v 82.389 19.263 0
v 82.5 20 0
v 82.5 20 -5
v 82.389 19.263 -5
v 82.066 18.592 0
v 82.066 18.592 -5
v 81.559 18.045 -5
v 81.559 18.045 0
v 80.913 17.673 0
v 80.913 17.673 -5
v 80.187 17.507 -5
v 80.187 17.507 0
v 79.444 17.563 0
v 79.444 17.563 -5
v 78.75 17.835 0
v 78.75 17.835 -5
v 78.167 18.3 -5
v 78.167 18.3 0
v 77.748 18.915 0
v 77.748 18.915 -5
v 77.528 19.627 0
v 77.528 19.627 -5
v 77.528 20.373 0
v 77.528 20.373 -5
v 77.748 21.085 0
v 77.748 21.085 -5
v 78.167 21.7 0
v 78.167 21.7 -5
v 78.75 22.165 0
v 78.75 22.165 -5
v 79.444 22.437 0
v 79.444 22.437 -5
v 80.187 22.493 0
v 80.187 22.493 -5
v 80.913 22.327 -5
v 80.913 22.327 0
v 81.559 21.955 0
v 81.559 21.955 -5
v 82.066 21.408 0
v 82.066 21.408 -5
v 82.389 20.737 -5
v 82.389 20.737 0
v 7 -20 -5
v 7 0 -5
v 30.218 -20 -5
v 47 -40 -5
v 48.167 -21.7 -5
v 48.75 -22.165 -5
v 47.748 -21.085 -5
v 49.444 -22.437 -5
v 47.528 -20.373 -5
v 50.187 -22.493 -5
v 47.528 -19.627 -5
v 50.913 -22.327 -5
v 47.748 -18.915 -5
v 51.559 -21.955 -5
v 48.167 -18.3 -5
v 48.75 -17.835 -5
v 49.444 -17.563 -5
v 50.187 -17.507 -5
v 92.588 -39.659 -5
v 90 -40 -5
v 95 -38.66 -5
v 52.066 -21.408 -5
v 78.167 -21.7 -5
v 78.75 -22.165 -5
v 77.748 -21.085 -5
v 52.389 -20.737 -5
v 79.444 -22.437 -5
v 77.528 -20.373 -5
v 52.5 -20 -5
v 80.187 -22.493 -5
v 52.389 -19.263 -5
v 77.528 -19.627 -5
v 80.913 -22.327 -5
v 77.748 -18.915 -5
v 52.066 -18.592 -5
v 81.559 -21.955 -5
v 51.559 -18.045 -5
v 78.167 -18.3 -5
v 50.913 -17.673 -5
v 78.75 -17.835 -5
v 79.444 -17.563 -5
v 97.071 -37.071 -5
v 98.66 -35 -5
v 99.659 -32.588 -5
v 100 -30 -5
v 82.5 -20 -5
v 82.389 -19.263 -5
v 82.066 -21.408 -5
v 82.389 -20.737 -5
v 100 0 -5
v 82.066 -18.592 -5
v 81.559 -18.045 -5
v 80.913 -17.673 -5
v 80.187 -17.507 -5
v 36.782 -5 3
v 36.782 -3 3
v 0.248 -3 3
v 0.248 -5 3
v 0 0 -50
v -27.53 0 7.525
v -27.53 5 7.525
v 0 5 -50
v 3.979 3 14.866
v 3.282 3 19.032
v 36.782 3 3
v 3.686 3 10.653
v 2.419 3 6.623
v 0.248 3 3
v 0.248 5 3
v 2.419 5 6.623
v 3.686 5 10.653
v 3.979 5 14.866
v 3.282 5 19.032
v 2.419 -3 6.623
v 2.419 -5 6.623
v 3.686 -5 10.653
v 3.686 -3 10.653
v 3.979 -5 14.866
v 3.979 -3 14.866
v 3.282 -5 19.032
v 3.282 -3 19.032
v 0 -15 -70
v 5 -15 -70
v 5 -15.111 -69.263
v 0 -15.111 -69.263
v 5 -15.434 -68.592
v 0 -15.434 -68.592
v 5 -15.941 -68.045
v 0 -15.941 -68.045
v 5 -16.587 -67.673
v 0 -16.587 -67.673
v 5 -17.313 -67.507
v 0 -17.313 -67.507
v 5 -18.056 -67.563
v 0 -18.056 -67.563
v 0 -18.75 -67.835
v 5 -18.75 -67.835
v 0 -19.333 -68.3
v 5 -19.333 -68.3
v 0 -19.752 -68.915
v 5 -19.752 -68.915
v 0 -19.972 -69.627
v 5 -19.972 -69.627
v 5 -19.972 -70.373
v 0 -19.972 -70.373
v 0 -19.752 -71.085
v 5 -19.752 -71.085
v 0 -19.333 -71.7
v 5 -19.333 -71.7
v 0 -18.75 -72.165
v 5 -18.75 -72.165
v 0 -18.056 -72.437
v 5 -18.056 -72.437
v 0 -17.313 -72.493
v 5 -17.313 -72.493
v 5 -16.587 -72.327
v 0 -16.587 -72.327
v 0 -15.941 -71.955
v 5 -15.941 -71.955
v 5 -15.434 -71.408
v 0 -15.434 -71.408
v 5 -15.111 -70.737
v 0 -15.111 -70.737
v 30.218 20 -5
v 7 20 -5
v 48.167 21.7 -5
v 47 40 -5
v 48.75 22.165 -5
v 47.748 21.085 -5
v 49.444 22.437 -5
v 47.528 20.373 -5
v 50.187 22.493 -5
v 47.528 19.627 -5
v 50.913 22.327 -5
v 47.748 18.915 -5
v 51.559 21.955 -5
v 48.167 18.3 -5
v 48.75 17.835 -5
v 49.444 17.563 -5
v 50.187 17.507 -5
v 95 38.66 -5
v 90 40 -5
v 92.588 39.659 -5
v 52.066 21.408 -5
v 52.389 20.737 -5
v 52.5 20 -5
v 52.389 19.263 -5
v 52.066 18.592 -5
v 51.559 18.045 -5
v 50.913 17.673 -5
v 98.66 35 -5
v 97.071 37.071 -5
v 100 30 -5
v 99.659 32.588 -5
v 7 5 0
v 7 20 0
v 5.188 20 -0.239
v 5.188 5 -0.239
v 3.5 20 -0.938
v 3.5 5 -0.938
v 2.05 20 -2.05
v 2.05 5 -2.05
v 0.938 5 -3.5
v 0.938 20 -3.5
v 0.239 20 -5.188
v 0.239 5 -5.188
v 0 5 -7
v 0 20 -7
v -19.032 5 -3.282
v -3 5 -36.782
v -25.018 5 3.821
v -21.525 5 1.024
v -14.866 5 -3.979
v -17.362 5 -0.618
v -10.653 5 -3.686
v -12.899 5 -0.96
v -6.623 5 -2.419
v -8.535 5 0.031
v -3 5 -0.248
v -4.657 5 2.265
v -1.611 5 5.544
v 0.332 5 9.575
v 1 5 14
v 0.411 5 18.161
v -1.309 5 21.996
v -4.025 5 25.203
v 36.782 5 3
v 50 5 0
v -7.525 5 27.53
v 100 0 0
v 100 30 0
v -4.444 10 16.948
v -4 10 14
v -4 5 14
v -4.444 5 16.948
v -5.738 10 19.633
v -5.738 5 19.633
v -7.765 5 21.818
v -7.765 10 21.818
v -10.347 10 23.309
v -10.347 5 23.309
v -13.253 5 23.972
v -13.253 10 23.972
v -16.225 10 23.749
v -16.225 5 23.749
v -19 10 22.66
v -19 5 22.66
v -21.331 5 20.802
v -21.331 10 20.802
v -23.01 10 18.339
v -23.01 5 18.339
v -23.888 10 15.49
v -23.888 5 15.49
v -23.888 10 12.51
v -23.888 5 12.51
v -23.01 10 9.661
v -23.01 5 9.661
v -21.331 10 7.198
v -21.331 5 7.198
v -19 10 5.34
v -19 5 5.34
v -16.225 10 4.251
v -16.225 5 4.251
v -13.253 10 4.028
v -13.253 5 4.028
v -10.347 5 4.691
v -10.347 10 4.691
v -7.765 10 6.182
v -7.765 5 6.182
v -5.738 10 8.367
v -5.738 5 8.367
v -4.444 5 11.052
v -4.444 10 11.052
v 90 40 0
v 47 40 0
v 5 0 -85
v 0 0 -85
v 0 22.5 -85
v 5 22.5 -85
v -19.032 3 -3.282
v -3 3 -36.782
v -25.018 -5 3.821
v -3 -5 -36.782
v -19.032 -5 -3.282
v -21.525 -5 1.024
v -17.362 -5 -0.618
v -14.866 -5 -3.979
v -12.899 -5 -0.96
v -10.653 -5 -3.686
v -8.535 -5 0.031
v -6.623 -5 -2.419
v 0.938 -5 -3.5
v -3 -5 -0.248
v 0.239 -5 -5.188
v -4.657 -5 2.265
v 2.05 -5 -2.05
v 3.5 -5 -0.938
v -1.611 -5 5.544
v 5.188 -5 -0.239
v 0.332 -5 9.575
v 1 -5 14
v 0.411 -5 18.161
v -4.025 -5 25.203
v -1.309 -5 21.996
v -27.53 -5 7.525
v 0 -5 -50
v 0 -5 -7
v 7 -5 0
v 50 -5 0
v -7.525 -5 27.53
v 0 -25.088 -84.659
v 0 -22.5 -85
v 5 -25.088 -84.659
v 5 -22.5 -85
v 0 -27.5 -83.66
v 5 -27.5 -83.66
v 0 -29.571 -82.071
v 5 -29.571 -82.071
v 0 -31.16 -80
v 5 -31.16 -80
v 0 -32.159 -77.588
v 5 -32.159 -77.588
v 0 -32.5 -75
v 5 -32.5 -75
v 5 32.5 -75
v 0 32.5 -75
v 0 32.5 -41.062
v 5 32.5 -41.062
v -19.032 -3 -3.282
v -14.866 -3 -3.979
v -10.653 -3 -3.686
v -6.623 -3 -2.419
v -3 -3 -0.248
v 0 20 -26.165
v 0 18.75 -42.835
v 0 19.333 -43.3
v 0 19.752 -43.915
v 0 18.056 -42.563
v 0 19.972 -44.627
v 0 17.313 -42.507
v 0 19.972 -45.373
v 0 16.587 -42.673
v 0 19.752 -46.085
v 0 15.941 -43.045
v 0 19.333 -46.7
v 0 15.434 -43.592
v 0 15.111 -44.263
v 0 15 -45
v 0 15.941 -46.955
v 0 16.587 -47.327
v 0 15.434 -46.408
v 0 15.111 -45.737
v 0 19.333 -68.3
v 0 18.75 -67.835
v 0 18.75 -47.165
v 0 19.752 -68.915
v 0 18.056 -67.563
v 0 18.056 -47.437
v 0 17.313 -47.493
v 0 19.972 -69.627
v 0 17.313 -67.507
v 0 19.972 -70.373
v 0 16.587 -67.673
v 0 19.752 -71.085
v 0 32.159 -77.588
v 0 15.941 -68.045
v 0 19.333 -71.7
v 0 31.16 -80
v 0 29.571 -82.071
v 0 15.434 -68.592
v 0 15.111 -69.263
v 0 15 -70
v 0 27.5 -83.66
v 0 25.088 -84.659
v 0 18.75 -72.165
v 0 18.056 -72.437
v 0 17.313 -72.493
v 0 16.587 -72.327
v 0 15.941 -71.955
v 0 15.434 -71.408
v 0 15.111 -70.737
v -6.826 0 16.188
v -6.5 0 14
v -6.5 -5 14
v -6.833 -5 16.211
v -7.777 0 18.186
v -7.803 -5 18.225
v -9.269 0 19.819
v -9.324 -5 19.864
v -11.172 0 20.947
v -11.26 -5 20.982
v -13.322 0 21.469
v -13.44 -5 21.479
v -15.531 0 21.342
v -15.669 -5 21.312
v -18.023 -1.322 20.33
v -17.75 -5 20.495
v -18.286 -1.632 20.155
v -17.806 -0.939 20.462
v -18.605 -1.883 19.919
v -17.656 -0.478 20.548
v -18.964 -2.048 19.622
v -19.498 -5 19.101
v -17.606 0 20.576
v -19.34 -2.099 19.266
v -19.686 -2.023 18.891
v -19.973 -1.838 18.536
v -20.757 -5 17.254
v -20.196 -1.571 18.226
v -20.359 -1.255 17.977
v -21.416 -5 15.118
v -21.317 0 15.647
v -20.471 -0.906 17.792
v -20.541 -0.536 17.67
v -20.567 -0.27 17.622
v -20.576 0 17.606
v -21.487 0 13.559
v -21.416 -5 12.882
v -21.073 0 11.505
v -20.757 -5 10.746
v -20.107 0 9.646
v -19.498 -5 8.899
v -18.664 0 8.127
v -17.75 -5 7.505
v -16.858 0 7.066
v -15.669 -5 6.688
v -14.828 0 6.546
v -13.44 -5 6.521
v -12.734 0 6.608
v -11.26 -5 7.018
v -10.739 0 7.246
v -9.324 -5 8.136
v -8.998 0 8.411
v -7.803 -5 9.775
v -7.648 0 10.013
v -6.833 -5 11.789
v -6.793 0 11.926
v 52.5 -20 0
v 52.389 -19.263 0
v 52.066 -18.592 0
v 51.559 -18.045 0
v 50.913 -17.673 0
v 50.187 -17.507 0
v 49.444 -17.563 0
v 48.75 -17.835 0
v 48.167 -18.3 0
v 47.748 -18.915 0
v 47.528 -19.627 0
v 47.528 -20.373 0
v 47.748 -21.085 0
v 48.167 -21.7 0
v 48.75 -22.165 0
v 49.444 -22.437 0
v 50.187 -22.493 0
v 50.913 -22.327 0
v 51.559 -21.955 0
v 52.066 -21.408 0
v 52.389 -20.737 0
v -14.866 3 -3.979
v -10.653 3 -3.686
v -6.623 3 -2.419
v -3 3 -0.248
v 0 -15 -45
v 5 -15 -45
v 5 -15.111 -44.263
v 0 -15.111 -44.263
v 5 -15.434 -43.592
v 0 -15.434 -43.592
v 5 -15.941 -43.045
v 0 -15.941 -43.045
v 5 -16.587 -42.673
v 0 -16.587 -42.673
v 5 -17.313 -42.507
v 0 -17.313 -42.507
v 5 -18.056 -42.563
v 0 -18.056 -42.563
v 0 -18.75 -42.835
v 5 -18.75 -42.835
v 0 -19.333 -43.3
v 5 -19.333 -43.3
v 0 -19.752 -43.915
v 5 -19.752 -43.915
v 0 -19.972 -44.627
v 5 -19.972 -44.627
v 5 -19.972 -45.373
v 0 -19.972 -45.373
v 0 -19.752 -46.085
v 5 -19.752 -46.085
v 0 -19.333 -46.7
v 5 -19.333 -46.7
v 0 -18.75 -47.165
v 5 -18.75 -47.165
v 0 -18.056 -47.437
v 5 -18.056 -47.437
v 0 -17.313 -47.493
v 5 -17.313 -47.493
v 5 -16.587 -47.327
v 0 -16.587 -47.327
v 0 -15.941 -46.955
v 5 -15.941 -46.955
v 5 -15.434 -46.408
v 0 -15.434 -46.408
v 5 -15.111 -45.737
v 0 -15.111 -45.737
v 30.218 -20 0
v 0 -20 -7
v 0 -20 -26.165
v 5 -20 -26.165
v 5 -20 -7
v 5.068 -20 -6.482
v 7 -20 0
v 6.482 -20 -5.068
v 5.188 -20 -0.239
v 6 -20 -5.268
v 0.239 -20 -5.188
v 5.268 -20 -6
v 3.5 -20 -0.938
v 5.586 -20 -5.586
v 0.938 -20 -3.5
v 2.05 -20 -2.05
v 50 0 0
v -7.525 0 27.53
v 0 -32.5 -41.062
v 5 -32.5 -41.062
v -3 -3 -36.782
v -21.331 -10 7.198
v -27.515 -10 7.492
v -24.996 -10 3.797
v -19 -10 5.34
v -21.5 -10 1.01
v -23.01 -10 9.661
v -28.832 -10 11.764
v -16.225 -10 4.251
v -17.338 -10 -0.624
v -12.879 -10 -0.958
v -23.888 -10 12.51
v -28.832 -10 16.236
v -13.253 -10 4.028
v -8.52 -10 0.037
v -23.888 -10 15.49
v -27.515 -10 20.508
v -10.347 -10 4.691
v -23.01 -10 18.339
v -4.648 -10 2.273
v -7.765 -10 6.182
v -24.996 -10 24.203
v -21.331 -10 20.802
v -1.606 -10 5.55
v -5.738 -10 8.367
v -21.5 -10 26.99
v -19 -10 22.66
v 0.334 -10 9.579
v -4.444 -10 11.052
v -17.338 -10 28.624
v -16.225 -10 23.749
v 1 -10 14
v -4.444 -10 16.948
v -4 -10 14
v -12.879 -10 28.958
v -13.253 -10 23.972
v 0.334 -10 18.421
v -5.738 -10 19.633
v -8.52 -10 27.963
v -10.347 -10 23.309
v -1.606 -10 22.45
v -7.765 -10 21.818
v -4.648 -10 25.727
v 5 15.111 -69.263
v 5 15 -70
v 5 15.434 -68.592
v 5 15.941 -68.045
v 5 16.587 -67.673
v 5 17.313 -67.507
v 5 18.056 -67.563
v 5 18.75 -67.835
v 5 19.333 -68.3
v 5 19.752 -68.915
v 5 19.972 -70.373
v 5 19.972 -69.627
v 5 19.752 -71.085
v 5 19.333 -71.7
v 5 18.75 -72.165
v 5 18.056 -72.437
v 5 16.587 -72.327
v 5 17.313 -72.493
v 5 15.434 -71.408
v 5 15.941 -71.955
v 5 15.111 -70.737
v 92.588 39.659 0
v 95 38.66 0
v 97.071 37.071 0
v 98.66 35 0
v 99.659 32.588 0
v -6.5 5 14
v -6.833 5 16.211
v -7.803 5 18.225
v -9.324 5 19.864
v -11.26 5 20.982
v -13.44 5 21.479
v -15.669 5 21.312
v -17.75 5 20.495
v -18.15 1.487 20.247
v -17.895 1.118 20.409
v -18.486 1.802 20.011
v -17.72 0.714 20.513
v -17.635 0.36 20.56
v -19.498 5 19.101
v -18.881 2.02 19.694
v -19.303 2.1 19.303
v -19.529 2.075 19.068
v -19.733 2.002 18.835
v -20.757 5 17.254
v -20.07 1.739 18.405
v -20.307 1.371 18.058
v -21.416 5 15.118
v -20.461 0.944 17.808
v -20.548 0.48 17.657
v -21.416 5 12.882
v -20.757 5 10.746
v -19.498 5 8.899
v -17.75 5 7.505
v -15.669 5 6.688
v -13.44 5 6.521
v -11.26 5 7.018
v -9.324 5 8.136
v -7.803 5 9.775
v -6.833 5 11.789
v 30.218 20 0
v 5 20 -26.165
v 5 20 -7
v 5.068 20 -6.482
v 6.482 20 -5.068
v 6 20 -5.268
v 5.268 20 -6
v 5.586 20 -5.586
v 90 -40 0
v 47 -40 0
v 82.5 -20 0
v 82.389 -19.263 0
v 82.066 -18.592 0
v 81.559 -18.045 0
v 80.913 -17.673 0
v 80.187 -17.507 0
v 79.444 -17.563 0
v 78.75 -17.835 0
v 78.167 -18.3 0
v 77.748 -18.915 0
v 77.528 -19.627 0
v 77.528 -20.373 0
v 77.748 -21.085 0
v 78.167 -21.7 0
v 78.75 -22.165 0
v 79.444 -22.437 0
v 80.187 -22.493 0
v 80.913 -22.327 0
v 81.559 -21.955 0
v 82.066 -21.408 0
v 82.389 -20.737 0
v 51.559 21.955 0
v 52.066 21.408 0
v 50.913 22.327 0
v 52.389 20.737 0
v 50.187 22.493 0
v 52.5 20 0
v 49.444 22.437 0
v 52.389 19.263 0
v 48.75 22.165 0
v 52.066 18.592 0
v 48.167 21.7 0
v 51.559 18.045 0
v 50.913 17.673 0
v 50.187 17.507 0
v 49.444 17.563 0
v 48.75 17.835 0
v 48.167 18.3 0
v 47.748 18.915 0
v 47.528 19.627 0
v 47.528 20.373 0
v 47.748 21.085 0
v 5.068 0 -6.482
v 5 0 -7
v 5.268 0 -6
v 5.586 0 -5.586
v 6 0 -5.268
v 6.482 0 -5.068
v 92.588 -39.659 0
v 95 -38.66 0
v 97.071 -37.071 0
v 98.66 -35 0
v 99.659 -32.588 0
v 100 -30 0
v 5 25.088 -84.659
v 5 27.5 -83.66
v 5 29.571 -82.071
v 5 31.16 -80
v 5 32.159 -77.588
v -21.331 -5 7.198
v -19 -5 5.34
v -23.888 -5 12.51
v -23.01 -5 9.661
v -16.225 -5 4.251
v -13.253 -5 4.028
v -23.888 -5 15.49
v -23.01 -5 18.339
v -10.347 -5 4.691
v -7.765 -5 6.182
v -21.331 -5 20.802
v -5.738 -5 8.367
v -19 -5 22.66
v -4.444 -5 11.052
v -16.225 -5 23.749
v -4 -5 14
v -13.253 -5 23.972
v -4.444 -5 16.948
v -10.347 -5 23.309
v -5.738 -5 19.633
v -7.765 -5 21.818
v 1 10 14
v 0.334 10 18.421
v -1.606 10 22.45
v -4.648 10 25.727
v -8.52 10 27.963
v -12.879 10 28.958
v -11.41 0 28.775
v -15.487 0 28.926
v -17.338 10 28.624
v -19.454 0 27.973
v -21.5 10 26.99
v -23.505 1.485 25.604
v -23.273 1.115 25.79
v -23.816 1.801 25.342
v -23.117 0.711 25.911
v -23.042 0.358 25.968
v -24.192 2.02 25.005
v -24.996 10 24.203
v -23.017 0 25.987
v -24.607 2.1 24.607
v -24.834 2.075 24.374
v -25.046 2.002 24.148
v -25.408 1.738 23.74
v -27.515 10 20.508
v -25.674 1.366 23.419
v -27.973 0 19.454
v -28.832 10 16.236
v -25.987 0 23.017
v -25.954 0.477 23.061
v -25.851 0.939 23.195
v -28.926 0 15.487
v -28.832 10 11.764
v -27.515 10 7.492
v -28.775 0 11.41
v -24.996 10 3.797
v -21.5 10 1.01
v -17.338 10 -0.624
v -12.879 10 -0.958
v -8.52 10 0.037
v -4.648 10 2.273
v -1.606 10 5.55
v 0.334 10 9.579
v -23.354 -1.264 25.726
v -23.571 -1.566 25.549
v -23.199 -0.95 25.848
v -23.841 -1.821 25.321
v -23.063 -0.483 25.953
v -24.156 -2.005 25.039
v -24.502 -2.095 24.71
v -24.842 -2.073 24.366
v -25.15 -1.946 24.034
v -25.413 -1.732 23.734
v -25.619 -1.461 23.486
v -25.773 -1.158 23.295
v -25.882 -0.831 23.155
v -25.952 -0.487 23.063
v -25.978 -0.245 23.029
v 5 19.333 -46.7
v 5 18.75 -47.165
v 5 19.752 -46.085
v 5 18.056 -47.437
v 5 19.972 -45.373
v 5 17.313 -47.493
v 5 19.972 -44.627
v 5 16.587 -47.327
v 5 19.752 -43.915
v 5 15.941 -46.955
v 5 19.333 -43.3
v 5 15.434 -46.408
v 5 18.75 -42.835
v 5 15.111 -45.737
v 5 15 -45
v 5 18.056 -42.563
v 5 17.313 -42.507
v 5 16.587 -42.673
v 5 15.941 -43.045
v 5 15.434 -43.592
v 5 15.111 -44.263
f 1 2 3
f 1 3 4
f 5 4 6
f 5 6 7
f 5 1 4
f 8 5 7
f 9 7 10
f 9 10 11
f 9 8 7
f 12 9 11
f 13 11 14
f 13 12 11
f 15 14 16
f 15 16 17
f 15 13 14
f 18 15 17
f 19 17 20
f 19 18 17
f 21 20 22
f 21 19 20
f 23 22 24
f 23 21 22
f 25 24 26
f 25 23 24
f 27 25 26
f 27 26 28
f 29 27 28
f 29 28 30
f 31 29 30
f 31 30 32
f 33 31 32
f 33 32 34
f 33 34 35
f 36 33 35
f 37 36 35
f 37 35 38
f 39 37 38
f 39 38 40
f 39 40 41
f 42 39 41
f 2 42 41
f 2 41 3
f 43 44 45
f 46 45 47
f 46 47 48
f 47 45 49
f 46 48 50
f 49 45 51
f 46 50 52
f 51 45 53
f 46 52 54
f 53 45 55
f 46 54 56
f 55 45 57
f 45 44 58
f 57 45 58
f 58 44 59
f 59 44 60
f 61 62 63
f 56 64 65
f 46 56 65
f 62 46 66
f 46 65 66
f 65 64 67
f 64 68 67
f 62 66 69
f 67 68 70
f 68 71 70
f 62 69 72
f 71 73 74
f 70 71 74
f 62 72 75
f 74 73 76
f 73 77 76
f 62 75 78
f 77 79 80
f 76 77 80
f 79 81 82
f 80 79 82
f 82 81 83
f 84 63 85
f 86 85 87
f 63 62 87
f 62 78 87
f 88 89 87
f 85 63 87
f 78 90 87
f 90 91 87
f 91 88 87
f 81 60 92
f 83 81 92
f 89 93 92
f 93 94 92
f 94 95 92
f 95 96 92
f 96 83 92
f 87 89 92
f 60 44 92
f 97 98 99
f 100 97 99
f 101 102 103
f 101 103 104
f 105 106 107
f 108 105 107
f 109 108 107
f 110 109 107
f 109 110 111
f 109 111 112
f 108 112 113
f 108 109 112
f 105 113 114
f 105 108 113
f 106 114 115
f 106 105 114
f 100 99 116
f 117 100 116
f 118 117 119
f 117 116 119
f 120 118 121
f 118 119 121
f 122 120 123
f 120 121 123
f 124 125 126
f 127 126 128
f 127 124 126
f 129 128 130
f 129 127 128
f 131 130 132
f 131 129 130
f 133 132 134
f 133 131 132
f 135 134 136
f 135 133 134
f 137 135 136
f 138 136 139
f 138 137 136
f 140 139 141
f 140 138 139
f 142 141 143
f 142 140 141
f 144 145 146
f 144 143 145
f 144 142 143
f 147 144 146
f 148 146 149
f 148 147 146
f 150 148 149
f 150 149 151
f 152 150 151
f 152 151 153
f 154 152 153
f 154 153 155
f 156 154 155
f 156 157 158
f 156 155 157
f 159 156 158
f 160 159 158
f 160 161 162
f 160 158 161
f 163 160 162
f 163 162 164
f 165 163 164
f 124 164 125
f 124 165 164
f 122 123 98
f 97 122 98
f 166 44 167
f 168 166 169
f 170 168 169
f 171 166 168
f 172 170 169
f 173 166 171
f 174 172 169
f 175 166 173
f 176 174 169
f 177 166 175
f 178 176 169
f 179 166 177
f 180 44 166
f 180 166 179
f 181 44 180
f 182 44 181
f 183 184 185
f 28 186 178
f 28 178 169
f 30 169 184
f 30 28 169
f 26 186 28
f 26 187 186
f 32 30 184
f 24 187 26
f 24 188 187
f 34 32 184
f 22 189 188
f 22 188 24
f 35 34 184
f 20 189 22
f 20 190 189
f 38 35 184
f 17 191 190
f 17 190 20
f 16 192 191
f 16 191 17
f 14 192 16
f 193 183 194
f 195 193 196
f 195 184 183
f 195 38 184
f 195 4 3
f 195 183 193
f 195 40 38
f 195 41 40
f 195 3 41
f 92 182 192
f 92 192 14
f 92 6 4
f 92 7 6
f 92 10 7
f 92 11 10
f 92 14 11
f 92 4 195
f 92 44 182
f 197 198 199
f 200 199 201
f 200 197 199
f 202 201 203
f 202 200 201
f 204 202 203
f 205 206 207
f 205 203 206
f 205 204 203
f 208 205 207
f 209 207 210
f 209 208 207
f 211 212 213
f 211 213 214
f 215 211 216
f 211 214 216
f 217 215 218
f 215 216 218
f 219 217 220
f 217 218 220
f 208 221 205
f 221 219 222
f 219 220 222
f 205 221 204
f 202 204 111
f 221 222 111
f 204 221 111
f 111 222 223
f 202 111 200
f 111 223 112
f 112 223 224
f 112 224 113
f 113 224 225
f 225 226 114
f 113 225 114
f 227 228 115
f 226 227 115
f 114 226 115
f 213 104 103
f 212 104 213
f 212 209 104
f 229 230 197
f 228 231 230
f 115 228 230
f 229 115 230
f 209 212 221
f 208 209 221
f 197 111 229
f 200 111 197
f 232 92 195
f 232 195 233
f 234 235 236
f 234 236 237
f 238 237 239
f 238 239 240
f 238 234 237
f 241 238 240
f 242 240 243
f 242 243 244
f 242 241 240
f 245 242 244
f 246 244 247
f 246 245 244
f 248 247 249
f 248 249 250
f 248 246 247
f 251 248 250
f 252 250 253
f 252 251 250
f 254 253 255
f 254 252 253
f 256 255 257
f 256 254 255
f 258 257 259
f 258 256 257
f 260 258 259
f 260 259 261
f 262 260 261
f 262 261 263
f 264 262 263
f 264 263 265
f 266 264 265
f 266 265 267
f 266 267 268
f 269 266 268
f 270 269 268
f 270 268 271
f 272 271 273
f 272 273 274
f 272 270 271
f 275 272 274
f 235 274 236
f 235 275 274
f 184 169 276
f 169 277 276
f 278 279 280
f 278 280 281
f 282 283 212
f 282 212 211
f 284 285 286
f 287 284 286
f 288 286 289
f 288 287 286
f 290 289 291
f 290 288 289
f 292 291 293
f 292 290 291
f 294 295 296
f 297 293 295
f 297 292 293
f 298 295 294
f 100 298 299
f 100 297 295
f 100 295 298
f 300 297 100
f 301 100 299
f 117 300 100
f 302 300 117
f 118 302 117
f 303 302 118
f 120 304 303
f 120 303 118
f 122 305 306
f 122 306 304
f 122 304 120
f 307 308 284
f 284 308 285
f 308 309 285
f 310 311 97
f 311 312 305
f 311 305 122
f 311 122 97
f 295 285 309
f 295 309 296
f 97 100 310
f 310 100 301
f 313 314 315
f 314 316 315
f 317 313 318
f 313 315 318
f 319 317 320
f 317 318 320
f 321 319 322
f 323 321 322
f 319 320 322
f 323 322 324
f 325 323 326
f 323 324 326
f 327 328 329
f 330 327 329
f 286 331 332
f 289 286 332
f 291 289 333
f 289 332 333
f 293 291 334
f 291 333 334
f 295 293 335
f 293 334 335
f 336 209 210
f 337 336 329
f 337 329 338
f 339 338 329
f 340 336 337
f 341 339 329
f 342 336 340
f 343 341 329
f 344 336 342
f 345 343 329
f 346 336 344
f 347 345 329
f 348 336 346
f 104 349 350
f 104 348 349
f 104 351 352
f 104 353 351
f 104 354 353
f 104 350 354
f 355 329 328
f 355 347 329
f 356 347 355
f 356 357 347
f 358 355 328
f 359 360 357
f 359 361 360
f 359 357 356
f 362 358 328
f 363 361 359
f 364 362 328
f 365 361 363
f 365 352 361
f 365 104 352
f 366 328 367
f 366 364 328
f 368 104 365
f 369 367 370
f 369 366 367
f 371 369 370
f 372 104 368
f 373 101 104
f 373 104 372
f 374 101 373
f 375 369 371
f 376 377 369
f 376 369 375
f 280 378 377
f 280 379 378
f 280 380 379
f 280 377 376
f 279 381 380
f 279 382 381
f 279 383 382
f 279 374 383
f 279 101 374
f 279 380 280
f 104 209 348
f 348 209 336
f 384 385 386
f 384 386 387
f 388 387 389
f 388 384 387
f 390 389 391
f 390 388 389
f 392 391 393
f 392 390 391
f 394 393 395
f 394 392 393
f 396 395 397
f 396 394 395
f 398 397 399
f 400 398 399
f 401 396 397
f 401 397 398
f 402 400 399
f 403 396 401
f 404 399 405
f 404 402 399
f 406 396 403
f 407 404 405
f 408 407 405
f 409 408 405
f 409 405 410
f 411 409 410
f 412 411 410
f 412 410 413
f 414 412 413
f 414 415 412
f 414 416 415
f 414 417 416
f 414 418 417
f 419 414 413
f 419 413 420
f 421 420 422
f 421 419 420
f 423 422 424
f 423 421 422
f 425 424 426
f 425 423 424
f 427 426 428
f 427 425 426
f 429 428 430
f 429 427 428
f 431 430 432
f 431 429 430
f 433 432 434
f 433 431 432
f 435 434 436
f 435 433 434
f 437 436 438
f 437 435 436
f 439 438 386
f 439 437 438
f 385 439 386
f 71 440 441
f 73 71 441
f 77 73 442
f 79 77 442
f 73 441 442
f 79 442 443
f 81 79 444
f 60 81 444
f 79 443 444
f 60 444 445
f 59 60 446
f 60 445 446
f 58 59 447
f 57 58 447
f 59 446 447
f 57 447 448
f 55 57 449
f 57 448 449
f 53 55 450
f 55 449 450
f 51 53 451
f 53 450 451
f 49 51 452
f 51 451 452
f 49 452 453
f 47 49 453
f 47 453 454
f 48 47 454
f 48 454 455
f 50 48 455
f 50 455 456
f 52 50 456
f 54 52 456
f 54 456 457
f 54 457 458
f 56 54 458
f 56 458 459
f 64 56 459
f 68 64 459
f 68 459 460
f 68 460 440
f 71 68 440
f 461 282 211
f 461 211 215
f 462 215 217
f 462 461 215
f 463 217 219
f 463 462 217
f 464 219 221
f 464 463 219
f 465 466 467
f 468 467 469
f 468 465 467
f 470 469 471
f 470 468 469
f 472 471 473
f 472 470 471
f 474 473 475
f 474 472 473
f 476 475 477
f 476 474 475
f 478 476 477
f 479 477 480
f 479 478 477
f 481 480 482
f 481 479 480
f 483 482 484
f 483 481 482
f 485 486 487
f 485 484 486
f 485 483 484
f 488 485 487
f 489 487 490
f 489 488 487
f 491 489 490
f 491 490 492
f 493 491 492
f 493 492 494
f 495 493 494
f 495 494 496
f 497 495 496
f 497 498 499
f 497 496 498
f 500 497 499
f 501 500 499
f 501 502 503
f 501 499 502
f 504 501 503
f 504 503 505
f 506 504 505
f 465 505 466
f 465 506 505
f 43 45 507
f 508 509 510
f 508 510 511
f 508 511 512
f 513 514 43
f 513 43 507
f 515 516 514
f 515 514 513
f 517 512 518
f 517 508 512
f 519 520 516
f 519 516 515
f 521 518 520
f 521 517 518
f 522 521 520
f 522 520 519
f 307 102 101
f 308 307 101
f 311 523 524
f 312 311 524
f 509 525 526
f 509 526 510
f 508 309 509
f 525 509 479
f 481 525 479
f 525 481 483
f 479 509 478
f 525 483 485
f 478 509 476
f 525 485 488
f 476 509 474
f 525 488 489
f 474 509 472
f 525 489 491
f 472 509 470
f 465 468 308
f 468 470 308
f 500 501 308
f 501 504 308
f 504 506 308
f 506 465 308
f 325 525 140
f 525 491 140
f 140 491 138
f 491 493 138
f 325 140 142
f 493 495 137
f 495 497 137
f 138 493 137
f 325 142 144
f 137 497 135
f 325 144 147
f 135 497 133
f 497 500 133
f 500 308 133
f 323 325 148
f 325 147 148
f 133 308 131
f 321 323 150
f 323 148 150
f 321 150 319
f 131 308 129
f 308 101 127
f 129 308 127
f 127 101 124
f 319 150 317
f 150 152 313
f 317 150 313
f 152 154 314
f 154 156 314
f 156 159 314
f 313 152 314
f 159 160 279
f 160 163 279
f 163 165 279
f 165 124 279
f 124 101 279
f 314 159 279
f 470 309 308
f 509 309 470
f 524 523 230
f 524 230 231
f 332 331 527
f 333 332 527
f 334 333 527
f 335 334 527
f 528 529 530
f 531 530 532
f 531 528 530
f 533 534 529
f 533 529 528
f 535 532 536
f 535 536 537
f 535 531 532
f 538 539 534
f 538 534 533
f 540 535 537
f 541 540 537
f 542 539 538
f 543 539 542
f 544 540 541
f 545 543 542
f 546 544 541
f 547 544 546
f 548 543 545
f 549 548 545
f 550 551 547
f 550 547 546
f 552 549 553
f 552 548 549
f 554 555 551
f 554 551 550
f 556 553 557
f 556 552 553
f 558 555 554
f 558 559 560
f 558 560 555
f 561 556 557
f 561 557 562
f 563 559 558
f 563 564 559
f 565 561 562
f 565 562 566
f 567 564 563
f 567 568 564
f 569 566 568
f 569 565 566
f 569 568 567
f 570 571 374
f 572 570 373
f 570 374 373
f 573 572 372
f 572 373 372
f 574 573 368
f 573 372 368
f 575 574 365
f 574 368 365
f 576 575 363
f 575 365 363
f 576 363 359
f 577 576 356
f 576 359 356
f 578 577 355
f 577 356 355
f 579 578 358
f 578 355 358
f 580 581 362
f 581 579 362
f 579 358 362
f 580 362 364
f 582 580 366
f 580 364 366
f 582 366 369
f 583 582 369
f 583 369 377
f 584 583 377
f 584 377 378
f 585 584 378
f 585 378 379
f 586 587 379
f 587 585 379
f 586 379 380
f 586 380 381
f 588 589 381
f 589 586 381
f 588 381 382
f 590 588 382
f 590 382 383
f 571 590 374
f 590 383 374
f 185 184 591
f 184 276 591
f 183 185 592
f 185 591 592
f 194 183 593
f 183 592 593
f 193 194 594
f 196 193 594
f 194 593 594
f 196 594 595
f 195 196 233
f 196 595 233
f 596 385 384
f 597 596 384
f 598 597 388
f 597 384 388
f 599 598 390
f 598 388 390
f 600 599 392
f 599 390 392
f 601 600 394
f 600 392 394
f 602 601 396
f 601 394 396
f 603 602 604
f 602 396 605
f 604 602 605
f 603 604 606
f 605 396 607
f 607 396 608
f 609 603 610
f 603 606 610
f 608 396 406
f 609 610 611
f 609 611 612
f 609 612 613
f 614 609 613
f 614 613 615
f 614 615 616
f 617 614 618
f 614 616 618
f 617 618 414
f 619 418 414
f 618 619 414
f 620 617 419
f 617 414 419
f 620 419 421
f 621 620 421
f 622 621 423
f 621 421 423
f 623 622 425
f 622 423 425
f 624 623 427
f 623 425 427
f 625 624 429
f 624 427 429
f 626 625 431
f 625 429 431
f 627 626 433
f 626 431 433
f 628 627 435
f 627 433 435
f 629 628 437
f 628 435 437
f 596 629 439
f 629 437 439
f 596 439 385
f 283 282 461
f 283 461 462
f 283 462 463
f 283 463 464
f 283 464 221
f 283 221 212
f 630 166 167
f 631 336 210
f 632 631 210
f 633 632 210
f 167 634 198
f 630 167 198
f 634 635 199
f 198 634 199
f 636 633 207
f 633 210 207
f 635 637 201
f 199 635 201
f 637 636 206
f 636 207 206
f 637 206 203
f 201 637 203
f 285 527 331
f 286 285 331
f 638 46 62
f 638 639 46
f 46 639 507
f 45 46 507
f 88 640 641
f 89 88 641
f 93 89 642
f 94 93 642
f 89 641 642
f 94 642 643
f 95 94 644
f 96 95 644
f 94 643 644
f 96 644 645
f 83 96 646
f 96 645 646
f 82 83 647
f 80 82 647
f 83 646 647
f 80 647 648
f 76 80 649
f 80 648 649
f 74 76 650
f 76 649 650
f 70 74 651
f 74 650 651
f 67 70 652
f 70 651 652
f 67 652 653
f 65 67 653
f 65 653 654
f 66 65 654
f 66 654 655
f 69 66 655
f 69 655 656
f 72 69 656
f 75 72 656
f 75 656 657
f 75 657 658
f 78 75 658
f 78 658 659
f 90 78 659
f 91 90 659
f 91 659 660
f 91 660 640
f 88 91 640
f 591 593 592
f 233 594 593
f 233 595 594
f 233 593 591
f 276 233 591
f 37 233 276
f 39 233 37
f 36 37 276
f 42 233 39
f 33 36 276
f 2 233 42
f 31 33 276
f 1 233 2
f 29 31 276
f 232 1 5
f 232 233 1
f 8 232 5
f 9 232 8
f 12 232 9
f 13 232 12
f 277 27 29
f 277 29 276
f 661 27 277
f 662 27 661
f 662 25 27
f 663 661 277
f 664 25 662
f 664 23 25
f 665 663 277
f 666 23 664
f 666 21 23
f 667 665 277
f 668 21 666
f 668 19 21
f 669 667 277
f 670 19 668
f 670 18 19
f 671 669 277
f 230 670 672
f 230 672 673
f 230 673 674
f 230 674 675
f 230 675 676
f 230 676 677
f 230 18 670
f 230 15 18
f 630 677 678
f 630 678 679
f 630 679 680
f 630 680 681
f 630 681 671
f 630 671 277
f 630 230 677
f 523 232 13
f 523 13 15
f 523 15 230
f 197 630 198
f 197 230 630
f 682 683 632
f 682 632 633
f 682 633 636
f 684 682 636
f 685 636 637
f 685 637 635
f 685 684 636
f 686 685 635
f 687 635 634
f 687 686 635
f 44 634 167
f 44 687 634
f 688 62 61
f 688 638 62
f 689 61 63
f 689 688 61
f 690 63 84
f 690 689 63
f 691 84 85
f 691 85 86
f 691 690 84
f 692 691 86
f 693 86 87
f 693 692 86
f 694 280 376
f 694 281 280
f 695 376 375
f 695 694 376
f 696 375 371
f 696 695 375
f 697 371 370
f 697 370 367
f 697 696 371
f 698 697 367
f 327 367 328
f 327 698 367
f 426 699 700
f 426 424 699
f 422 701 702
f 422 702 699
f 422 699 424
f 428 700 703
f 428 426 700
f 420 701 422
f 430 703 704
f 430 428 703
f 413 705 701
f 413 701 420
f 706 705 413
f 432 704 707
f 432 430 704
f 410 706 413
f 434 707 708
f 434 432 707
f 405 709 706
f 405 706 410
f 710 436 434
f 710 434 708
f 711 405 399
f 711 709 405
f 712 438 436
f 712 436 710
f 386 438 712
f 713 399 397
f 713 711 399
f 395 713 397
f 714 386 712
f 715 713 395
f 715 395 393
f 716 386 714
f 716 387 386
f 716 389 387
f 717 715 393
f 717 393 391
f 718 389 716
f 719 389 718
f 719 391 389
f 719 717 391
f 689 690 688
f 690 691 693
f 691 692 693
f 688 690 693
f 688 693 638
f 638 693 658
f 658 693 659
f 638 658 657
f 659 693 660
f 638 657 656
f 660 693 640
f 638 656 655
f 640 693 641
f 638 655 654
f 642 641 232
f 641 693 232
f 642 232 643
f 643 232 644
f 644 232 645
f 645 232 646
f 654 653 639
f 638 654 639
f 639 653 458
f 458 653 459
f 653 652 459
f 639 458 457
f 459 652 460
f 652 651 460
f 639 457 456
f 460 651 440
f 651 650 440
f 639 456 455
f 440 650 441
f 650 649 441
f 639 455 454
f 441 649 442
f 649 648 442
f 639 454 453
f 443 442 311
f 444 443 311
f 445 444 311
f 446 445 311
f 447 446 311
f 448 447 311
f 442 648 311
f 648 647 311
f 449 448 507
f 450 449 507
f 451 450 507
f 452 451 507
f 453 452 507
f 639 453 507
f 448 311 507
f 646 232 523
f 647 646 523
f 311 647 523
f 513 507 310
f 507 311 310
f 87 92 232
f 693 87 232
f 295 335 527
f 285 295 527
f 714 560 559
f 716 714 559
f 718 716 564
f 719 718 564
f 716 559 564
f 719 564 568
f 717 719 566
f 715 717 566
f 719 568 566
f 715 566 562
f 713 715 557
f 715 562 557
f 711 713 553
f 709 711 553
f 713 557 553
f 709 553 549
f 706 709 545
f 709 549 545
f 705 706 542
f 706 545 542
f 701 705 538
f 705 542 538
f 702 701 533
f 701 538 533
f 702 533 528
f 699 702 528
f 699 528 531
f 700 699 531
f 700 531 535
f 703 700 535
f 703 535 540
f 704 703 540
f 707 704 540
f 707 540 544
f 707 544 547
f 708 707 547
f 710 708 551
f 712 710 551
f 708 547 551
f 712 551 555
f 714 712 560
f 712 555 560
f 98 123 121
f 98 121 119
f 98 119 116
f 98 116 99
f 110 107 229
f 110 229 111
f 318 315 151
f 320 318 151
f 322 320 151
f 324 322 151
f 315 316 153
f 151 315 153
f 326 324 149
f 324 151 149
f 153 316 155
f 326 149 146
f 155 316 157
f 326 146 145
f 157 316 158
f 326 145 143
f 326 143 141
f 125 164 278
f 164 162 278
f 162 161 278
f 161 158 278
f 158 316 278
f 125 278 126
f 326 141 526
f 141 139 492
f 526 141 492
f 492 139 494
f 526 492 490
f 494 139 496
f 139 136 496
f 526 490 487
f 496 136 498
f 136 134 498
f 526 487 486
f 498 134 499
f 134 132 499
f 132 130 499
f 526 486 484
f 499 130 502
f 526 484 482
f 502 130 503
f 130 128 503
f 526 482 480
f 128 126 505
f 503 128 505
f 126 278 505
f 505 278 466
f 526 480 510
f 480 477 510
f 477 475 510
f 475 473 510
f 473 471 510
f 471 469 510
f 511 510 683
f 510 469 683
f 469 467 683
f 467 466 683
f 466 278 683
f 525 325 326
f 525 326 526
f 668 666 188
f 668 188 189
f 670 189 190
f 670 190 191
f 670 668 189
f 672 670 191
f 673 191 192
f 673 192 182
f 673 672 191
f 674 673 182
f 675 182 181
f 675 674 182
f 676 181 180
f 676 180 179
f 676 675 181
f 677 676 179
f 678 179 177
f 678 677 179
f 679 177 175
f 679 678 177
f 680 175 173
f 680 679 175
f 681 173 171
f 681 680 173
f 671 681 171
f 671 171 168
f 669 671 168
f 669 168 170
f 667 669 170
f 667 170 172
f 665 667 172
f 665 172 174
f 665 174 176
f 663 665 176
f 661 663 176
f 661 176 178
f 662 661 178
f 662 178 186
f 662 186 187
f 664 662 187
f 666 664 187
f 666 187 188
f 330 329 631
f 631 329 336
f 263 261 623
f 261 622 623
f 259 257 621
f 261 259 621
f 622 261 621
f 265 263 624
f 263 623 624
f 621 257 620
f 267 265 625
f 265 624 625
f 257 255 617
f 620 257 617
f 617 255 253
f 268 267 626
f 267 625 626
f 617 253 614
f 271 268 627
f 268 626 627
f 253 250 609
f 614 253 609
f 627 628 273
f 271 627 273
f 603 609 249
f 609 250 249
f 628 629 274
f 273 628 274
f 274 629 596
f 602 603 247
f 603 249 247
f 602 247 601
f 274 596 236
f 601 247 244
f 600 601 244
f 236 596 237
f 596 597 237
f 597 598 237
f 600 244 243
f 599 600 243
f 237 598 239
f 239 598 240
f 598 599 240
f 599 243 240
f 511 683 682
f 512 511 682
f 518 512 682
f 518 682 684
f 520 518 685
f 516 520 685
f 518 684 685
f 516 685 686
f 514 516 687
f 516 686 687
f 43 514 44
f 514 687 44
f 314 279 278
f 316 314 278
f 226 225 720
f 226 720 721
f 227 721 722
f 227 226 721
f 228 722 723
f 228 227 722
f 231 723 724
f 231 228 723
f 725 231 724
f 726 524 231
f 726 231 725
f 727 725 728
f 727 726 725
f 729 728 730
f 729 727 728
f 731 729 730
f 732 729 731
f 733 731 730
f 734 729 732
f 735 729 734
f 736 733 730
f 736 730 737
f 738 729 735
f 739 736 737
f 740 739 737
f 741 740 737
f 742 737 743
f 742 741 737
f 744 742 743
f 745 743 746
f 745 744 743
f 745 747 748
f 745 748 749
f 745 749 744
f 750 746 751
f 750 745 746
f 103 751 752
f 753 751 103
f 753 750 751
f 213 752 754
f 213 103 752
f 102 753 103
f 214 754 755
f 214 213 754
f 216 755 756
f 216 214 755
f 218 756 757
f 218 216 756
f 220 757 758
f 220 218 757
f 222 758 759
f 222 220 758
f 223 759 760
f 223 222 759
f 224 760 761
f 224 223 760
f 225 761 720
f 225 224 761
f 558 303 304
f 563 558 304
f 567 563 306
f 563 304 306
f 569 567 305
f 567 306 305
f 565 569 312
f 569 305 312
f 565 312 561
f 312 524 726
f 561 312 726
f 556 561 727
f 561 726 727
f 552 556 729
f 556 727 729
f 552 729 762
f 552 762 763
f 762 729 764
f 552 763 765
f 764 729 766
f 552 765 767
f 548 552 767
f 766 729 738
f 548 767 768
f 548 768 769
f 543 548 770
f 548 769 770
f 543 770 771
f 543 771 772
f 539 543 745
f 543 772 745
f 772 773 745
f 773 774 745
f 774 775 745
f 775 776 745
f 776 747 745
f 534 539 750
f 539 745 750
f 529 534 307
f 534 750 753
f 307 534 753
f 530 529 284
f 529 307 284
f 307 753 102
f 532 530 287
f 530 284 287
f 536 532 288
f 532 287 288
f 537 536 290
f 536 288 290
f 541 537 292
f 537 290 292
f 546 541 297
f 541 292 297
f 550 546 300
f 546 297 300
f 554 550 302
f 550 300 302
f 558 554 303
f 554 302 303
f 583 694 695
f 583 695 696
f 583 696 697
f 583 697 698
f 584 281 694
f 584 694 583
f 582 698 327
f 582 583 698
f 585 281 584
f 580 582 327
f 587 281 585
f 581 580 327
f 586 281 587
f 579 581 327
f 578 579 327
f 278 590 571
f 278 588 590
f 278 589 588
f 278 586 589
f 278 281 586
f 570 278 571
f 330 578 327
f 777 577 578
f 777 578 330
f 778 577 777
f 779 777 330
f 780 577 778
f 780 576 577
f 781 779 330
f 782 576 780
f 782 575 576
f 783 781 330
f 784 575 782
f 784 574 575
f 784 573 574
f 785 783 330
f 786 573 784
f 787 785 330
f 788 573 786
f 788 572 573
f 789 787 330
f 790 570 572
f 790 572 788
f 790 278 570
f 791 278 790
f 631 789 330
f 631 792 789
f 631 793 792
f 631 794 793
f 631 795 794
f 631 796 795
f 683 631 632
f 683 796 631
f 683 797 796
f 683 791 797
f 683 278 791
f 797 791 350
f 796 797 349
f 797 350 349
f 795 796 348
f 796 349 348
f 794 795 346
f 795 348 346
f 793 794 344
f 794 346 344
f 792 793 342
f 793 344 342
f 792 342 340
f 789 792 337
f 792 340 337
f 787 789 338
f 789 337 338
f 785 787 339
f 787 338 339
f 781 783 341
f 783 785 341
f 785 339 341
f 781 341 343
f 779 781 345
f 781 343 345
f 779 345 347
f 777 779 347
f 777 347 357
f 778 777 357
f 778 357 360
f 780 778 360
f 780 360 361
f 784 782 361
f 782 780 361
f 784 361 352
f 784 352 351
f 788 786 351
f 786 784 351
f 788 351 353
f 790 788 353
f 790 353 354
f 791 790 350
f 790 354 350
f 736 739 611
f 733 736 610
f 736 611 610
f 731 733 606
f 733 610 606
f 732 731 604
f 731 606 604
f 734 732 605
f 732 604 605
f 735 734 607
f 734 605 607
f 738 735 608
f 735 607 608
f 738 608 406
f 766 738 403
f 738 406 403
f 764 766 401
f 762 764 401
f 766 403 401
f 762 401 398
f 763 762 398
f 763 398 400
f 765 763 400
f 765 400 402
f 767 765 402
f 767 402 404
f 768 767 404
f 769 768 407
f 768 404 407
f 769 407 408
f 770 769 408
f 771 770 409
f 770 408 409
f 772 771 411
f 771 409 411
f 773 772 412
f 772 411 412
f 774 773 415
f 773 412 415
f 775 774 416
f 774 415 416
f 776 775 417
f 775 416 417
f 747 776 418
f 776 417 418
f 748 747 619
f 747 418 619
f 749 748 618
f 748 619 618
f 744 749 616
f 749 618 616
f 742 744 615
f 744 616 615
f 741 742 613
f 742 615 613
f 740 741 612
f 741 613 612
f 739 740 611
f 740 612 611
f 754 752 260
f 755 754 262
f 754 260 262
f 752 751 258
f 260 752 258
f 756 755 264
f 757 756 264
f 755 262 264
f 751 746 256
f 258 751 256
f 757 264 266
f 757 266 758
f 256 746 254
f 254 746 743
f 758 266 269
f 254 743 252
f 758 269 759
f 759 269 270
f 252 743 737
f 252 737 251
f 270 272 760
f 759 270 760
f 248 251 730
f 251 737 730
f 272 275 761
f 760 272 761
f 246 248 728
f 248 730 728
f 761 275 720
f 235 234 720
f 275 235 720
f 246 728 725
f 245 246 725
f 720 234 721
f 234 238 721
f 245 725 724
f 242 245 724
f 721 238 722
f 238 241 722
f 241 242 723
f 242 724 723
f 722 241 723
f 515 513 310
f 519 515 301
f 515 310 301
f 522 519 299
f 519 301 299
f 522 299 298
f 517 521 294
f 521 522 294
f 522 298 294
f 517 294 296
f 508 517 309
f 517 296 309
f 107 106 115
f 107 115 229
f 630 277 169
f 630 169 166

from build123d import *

# Parameters (mm, degrees)
F4_DEPTH  = 40
F5_DEPTH  = 10
F6_DEPTH  = 10
F7_R      = 10
F8_R      = 2.5
F10_DEPTH = 100.001
F9_R      = 2.5
F11_DEPTH = 85.001
F12_DEPTH = 5
F13_DEPTH = 3
F0_R      = 10
F0_R_2    = 7.5
F14_DEPTH = 10
F15_R     = 10
F15_R_2   = 7.5
F16_DEPTH = 5
F19_D     = 4.2
F19_DEPTH = 10
F19_TIP   = 1.2618073


with BuildPart() as f4:
    # F0 (on Front) → F4 (new body)
    with BuildSketch(Plane.XZ):
        with BuildLine():
            Line((0, -50), (0, -85))
            Line((0, -85), (5, -85))
            Line((5, -85), (5, -7))
            ThreePointArc((5, -7), (5.5857864376, -5.5857864376), (7, -5))
            Line((7, -5), (100, -5))
            Line((100, -5), (100, 0))
            Line((100, 0), (50, 0))
            Line((50, 0), (7, 0))
            ThreePointArc((7, 0), (2.0502525317, -2.0502525317), (0, -7))
            Line((0, -7), (0, -50))
        make_face()
    extrude(amount=F4_DEPTH)

    # F2 (on Right) → F5 (cut)
    with BuildSketch(Plane.YZ):
        Polygon((-20, -26.1649281481), (-20, 0), (-40, 0), (-40, -85), (-32.5, -85), (-32.5, -41.0618480555), align=None)
    extrude(amount=F5_DEPTH, mode=Mode.SUBTRACT)

    # F3 (on Top) → F6 (cut)
    with BuildSketch(Plane.XY):
        Polygon((30.2180073765, -20), (0, -20), (0, -40), (47, -40), align=None)
    extrude(amount=-F6_DEPTH, mode=Mode.SUBTRACT)

    # F7
    f7_edges = [f4.edges().sort_by_distance(p)[0] for p in [
        (2.5, -32.5, -85),
        (100, -40, -2.5),
    ]]
    fillet(f7_edges, radius=F7_R)

    # F8 (on Right) → F10 (cut, through all)
    with BuildSketch(Plane.YZ):
        with Locations((-17.5, -70)):
            Circle(F8_R)
        with Locations((-17.5, -45)):
            Circle(F8_R)
    extrude(amount=F10_DEPTH, mode=Mode.SUBTRACT)

    # F9 (on Top) → F11 (cut, through all)
    with BuildSketch(Plane.XY):
        with Locations((50, -20)):
            Circle(F9_R)
        with Locations((80, -20)):
            Circle(F9_R)
    extrude(amount=-F11_DEPTH, mode=Mode.SUBTRACT)

    # F0 (on Front) → F12 (join)
    with BuildSketch(Plane.XZ):
        with BuildLine():
            Line((-27.5303153895, 7.5246185085), (0, -50))
            Line((0, -50), (0, -7))
            ThreePointArc((0, -7), (2.0502525317, -2.0502525317), (7, 0))
            Line((7, 0), (50, 0))
            Line((50, 0), (-7.5246185085, 27.5303153895))
            ThreePointArc((-7.5246185085, 27.5303153895), (-1.3088471294, 21.9959138824), (1, 14))
            ThreePointArc((1, 14), (-10.6799646721, -0.6279651839), (-27.5303153895, 7.5246185085))
        make_face()
        with BuildLine():
            Line((-3, -36.782099822), (-19.0324950336, -3.2821871804))
            ThreePointArc((-19.0324950336, -3.2821871804), (-10.6526660041, -3.686021461), (-3, -0.2478068488))
            Line((-3, -0.2478068488), (-3, -36.782099822))
        make_face(mode=Mode.SUBTRACT)
        with BuildLine():
            ThreePointArc((0.2478068488, 3), (3.686021461, 10.6526660041), (3.2821871804, 19.0324950336))
            Line((3.2821871804, 19.0324950336), (36.782099822, 3))
            Line((36.782099822, 3), (0.2478068488, 3))
        make_face(mode=Mode.SUBTRACT)
    extrude(amount=F12_DEPTH)

    # F0 (on Front) → F13 (join)
    with BuildSketch(Plane.XZ):
        with BuildLine():
            Line((36.782099822, 3), (3.2821871804, 19.0324950336))
            ThreePointArc((3.2821871804, 19.0324950336), (3.686021461, 10.6526660041), (0.2478068488, 3))
            Line((0.2478068488, 3), (36.782099822, 3))
        make_face()
        with BuildLine():
            ThreePointArc((-3, -0.2478068488), (-10.6526660041, -3.686021461), (-19.0324950336, -3.2821871804))
            Line((-19.0324950336, -3.2821871804), (-3, -36.782099822))
            Line((-3, -36.782099822), (-3, -0.2478068488))
        make_face()
    extrude(amount=F13_DEPTH)

    # F0 (on Front) → F14 (join)
    with BuildSketch(Plane.XZ):
        with BuildLine():
            ThreePointArc((-7.5246185085, 27.5303153895), (-24.6066017178, 24.6066017178), (-27.5303153895, 7.5246185085))
            ThreePointArc((-27.5303153895, 7.5246185085), (-10.6799646721, -0.6279651839), (1, 14))
            ThreePointArc((1, 14), (-1.3088471294, 21.9959138824), (-7.5246185085, 27.5303153895))
        make_face()
        with Locations((-14, 14)):
            Circle(F0_R, mode=Mode.SUBTRACT)
        with Locations((-14, 14)):
            Circle(F0_R)
        with Locations((-14, 14)):
            Circle(F0_R_2, mode=Mode.SUBTRACT)
    extrude(amount=F14_DEPTH)

    # F15 (on face) → F16 (cut)
    with BuildSketch(Plane.XZ.offset(10)):
        with Locations((-14, 14)):
            Circle(F15_R)
        with Locations((-14, 14)):
            Circle(F15_R_2, mode=Mode.SUBTRACT)
    extrude(amount=-F16_DEPTH, mode=Mode.SUBTRACT)

    # F17: F4 across plane


with BuildPart() as f4_1:
    add(f4.part)
    add(f4.part.mirror(Plane.XZ))

    # F19
    with Locations(Plane(origin=(-24.6066017178, 0, 24.6066017178), x_dir=(0, -1, 0), z_dir=(-0.7071067812, 0, 0.7071067812))):
        with Locations((0, 0)):
            Hole(F19_D / 2, depth=F19_DEPTH)
            with Locations((0, 0, -(F19_DEPTH + F19_TIP / 2))):  # 118° drill point
                Cone(0, F19_D / 2, F19_TIP, mode=Mode.SUBTRACT)


solid = f4_1.part
